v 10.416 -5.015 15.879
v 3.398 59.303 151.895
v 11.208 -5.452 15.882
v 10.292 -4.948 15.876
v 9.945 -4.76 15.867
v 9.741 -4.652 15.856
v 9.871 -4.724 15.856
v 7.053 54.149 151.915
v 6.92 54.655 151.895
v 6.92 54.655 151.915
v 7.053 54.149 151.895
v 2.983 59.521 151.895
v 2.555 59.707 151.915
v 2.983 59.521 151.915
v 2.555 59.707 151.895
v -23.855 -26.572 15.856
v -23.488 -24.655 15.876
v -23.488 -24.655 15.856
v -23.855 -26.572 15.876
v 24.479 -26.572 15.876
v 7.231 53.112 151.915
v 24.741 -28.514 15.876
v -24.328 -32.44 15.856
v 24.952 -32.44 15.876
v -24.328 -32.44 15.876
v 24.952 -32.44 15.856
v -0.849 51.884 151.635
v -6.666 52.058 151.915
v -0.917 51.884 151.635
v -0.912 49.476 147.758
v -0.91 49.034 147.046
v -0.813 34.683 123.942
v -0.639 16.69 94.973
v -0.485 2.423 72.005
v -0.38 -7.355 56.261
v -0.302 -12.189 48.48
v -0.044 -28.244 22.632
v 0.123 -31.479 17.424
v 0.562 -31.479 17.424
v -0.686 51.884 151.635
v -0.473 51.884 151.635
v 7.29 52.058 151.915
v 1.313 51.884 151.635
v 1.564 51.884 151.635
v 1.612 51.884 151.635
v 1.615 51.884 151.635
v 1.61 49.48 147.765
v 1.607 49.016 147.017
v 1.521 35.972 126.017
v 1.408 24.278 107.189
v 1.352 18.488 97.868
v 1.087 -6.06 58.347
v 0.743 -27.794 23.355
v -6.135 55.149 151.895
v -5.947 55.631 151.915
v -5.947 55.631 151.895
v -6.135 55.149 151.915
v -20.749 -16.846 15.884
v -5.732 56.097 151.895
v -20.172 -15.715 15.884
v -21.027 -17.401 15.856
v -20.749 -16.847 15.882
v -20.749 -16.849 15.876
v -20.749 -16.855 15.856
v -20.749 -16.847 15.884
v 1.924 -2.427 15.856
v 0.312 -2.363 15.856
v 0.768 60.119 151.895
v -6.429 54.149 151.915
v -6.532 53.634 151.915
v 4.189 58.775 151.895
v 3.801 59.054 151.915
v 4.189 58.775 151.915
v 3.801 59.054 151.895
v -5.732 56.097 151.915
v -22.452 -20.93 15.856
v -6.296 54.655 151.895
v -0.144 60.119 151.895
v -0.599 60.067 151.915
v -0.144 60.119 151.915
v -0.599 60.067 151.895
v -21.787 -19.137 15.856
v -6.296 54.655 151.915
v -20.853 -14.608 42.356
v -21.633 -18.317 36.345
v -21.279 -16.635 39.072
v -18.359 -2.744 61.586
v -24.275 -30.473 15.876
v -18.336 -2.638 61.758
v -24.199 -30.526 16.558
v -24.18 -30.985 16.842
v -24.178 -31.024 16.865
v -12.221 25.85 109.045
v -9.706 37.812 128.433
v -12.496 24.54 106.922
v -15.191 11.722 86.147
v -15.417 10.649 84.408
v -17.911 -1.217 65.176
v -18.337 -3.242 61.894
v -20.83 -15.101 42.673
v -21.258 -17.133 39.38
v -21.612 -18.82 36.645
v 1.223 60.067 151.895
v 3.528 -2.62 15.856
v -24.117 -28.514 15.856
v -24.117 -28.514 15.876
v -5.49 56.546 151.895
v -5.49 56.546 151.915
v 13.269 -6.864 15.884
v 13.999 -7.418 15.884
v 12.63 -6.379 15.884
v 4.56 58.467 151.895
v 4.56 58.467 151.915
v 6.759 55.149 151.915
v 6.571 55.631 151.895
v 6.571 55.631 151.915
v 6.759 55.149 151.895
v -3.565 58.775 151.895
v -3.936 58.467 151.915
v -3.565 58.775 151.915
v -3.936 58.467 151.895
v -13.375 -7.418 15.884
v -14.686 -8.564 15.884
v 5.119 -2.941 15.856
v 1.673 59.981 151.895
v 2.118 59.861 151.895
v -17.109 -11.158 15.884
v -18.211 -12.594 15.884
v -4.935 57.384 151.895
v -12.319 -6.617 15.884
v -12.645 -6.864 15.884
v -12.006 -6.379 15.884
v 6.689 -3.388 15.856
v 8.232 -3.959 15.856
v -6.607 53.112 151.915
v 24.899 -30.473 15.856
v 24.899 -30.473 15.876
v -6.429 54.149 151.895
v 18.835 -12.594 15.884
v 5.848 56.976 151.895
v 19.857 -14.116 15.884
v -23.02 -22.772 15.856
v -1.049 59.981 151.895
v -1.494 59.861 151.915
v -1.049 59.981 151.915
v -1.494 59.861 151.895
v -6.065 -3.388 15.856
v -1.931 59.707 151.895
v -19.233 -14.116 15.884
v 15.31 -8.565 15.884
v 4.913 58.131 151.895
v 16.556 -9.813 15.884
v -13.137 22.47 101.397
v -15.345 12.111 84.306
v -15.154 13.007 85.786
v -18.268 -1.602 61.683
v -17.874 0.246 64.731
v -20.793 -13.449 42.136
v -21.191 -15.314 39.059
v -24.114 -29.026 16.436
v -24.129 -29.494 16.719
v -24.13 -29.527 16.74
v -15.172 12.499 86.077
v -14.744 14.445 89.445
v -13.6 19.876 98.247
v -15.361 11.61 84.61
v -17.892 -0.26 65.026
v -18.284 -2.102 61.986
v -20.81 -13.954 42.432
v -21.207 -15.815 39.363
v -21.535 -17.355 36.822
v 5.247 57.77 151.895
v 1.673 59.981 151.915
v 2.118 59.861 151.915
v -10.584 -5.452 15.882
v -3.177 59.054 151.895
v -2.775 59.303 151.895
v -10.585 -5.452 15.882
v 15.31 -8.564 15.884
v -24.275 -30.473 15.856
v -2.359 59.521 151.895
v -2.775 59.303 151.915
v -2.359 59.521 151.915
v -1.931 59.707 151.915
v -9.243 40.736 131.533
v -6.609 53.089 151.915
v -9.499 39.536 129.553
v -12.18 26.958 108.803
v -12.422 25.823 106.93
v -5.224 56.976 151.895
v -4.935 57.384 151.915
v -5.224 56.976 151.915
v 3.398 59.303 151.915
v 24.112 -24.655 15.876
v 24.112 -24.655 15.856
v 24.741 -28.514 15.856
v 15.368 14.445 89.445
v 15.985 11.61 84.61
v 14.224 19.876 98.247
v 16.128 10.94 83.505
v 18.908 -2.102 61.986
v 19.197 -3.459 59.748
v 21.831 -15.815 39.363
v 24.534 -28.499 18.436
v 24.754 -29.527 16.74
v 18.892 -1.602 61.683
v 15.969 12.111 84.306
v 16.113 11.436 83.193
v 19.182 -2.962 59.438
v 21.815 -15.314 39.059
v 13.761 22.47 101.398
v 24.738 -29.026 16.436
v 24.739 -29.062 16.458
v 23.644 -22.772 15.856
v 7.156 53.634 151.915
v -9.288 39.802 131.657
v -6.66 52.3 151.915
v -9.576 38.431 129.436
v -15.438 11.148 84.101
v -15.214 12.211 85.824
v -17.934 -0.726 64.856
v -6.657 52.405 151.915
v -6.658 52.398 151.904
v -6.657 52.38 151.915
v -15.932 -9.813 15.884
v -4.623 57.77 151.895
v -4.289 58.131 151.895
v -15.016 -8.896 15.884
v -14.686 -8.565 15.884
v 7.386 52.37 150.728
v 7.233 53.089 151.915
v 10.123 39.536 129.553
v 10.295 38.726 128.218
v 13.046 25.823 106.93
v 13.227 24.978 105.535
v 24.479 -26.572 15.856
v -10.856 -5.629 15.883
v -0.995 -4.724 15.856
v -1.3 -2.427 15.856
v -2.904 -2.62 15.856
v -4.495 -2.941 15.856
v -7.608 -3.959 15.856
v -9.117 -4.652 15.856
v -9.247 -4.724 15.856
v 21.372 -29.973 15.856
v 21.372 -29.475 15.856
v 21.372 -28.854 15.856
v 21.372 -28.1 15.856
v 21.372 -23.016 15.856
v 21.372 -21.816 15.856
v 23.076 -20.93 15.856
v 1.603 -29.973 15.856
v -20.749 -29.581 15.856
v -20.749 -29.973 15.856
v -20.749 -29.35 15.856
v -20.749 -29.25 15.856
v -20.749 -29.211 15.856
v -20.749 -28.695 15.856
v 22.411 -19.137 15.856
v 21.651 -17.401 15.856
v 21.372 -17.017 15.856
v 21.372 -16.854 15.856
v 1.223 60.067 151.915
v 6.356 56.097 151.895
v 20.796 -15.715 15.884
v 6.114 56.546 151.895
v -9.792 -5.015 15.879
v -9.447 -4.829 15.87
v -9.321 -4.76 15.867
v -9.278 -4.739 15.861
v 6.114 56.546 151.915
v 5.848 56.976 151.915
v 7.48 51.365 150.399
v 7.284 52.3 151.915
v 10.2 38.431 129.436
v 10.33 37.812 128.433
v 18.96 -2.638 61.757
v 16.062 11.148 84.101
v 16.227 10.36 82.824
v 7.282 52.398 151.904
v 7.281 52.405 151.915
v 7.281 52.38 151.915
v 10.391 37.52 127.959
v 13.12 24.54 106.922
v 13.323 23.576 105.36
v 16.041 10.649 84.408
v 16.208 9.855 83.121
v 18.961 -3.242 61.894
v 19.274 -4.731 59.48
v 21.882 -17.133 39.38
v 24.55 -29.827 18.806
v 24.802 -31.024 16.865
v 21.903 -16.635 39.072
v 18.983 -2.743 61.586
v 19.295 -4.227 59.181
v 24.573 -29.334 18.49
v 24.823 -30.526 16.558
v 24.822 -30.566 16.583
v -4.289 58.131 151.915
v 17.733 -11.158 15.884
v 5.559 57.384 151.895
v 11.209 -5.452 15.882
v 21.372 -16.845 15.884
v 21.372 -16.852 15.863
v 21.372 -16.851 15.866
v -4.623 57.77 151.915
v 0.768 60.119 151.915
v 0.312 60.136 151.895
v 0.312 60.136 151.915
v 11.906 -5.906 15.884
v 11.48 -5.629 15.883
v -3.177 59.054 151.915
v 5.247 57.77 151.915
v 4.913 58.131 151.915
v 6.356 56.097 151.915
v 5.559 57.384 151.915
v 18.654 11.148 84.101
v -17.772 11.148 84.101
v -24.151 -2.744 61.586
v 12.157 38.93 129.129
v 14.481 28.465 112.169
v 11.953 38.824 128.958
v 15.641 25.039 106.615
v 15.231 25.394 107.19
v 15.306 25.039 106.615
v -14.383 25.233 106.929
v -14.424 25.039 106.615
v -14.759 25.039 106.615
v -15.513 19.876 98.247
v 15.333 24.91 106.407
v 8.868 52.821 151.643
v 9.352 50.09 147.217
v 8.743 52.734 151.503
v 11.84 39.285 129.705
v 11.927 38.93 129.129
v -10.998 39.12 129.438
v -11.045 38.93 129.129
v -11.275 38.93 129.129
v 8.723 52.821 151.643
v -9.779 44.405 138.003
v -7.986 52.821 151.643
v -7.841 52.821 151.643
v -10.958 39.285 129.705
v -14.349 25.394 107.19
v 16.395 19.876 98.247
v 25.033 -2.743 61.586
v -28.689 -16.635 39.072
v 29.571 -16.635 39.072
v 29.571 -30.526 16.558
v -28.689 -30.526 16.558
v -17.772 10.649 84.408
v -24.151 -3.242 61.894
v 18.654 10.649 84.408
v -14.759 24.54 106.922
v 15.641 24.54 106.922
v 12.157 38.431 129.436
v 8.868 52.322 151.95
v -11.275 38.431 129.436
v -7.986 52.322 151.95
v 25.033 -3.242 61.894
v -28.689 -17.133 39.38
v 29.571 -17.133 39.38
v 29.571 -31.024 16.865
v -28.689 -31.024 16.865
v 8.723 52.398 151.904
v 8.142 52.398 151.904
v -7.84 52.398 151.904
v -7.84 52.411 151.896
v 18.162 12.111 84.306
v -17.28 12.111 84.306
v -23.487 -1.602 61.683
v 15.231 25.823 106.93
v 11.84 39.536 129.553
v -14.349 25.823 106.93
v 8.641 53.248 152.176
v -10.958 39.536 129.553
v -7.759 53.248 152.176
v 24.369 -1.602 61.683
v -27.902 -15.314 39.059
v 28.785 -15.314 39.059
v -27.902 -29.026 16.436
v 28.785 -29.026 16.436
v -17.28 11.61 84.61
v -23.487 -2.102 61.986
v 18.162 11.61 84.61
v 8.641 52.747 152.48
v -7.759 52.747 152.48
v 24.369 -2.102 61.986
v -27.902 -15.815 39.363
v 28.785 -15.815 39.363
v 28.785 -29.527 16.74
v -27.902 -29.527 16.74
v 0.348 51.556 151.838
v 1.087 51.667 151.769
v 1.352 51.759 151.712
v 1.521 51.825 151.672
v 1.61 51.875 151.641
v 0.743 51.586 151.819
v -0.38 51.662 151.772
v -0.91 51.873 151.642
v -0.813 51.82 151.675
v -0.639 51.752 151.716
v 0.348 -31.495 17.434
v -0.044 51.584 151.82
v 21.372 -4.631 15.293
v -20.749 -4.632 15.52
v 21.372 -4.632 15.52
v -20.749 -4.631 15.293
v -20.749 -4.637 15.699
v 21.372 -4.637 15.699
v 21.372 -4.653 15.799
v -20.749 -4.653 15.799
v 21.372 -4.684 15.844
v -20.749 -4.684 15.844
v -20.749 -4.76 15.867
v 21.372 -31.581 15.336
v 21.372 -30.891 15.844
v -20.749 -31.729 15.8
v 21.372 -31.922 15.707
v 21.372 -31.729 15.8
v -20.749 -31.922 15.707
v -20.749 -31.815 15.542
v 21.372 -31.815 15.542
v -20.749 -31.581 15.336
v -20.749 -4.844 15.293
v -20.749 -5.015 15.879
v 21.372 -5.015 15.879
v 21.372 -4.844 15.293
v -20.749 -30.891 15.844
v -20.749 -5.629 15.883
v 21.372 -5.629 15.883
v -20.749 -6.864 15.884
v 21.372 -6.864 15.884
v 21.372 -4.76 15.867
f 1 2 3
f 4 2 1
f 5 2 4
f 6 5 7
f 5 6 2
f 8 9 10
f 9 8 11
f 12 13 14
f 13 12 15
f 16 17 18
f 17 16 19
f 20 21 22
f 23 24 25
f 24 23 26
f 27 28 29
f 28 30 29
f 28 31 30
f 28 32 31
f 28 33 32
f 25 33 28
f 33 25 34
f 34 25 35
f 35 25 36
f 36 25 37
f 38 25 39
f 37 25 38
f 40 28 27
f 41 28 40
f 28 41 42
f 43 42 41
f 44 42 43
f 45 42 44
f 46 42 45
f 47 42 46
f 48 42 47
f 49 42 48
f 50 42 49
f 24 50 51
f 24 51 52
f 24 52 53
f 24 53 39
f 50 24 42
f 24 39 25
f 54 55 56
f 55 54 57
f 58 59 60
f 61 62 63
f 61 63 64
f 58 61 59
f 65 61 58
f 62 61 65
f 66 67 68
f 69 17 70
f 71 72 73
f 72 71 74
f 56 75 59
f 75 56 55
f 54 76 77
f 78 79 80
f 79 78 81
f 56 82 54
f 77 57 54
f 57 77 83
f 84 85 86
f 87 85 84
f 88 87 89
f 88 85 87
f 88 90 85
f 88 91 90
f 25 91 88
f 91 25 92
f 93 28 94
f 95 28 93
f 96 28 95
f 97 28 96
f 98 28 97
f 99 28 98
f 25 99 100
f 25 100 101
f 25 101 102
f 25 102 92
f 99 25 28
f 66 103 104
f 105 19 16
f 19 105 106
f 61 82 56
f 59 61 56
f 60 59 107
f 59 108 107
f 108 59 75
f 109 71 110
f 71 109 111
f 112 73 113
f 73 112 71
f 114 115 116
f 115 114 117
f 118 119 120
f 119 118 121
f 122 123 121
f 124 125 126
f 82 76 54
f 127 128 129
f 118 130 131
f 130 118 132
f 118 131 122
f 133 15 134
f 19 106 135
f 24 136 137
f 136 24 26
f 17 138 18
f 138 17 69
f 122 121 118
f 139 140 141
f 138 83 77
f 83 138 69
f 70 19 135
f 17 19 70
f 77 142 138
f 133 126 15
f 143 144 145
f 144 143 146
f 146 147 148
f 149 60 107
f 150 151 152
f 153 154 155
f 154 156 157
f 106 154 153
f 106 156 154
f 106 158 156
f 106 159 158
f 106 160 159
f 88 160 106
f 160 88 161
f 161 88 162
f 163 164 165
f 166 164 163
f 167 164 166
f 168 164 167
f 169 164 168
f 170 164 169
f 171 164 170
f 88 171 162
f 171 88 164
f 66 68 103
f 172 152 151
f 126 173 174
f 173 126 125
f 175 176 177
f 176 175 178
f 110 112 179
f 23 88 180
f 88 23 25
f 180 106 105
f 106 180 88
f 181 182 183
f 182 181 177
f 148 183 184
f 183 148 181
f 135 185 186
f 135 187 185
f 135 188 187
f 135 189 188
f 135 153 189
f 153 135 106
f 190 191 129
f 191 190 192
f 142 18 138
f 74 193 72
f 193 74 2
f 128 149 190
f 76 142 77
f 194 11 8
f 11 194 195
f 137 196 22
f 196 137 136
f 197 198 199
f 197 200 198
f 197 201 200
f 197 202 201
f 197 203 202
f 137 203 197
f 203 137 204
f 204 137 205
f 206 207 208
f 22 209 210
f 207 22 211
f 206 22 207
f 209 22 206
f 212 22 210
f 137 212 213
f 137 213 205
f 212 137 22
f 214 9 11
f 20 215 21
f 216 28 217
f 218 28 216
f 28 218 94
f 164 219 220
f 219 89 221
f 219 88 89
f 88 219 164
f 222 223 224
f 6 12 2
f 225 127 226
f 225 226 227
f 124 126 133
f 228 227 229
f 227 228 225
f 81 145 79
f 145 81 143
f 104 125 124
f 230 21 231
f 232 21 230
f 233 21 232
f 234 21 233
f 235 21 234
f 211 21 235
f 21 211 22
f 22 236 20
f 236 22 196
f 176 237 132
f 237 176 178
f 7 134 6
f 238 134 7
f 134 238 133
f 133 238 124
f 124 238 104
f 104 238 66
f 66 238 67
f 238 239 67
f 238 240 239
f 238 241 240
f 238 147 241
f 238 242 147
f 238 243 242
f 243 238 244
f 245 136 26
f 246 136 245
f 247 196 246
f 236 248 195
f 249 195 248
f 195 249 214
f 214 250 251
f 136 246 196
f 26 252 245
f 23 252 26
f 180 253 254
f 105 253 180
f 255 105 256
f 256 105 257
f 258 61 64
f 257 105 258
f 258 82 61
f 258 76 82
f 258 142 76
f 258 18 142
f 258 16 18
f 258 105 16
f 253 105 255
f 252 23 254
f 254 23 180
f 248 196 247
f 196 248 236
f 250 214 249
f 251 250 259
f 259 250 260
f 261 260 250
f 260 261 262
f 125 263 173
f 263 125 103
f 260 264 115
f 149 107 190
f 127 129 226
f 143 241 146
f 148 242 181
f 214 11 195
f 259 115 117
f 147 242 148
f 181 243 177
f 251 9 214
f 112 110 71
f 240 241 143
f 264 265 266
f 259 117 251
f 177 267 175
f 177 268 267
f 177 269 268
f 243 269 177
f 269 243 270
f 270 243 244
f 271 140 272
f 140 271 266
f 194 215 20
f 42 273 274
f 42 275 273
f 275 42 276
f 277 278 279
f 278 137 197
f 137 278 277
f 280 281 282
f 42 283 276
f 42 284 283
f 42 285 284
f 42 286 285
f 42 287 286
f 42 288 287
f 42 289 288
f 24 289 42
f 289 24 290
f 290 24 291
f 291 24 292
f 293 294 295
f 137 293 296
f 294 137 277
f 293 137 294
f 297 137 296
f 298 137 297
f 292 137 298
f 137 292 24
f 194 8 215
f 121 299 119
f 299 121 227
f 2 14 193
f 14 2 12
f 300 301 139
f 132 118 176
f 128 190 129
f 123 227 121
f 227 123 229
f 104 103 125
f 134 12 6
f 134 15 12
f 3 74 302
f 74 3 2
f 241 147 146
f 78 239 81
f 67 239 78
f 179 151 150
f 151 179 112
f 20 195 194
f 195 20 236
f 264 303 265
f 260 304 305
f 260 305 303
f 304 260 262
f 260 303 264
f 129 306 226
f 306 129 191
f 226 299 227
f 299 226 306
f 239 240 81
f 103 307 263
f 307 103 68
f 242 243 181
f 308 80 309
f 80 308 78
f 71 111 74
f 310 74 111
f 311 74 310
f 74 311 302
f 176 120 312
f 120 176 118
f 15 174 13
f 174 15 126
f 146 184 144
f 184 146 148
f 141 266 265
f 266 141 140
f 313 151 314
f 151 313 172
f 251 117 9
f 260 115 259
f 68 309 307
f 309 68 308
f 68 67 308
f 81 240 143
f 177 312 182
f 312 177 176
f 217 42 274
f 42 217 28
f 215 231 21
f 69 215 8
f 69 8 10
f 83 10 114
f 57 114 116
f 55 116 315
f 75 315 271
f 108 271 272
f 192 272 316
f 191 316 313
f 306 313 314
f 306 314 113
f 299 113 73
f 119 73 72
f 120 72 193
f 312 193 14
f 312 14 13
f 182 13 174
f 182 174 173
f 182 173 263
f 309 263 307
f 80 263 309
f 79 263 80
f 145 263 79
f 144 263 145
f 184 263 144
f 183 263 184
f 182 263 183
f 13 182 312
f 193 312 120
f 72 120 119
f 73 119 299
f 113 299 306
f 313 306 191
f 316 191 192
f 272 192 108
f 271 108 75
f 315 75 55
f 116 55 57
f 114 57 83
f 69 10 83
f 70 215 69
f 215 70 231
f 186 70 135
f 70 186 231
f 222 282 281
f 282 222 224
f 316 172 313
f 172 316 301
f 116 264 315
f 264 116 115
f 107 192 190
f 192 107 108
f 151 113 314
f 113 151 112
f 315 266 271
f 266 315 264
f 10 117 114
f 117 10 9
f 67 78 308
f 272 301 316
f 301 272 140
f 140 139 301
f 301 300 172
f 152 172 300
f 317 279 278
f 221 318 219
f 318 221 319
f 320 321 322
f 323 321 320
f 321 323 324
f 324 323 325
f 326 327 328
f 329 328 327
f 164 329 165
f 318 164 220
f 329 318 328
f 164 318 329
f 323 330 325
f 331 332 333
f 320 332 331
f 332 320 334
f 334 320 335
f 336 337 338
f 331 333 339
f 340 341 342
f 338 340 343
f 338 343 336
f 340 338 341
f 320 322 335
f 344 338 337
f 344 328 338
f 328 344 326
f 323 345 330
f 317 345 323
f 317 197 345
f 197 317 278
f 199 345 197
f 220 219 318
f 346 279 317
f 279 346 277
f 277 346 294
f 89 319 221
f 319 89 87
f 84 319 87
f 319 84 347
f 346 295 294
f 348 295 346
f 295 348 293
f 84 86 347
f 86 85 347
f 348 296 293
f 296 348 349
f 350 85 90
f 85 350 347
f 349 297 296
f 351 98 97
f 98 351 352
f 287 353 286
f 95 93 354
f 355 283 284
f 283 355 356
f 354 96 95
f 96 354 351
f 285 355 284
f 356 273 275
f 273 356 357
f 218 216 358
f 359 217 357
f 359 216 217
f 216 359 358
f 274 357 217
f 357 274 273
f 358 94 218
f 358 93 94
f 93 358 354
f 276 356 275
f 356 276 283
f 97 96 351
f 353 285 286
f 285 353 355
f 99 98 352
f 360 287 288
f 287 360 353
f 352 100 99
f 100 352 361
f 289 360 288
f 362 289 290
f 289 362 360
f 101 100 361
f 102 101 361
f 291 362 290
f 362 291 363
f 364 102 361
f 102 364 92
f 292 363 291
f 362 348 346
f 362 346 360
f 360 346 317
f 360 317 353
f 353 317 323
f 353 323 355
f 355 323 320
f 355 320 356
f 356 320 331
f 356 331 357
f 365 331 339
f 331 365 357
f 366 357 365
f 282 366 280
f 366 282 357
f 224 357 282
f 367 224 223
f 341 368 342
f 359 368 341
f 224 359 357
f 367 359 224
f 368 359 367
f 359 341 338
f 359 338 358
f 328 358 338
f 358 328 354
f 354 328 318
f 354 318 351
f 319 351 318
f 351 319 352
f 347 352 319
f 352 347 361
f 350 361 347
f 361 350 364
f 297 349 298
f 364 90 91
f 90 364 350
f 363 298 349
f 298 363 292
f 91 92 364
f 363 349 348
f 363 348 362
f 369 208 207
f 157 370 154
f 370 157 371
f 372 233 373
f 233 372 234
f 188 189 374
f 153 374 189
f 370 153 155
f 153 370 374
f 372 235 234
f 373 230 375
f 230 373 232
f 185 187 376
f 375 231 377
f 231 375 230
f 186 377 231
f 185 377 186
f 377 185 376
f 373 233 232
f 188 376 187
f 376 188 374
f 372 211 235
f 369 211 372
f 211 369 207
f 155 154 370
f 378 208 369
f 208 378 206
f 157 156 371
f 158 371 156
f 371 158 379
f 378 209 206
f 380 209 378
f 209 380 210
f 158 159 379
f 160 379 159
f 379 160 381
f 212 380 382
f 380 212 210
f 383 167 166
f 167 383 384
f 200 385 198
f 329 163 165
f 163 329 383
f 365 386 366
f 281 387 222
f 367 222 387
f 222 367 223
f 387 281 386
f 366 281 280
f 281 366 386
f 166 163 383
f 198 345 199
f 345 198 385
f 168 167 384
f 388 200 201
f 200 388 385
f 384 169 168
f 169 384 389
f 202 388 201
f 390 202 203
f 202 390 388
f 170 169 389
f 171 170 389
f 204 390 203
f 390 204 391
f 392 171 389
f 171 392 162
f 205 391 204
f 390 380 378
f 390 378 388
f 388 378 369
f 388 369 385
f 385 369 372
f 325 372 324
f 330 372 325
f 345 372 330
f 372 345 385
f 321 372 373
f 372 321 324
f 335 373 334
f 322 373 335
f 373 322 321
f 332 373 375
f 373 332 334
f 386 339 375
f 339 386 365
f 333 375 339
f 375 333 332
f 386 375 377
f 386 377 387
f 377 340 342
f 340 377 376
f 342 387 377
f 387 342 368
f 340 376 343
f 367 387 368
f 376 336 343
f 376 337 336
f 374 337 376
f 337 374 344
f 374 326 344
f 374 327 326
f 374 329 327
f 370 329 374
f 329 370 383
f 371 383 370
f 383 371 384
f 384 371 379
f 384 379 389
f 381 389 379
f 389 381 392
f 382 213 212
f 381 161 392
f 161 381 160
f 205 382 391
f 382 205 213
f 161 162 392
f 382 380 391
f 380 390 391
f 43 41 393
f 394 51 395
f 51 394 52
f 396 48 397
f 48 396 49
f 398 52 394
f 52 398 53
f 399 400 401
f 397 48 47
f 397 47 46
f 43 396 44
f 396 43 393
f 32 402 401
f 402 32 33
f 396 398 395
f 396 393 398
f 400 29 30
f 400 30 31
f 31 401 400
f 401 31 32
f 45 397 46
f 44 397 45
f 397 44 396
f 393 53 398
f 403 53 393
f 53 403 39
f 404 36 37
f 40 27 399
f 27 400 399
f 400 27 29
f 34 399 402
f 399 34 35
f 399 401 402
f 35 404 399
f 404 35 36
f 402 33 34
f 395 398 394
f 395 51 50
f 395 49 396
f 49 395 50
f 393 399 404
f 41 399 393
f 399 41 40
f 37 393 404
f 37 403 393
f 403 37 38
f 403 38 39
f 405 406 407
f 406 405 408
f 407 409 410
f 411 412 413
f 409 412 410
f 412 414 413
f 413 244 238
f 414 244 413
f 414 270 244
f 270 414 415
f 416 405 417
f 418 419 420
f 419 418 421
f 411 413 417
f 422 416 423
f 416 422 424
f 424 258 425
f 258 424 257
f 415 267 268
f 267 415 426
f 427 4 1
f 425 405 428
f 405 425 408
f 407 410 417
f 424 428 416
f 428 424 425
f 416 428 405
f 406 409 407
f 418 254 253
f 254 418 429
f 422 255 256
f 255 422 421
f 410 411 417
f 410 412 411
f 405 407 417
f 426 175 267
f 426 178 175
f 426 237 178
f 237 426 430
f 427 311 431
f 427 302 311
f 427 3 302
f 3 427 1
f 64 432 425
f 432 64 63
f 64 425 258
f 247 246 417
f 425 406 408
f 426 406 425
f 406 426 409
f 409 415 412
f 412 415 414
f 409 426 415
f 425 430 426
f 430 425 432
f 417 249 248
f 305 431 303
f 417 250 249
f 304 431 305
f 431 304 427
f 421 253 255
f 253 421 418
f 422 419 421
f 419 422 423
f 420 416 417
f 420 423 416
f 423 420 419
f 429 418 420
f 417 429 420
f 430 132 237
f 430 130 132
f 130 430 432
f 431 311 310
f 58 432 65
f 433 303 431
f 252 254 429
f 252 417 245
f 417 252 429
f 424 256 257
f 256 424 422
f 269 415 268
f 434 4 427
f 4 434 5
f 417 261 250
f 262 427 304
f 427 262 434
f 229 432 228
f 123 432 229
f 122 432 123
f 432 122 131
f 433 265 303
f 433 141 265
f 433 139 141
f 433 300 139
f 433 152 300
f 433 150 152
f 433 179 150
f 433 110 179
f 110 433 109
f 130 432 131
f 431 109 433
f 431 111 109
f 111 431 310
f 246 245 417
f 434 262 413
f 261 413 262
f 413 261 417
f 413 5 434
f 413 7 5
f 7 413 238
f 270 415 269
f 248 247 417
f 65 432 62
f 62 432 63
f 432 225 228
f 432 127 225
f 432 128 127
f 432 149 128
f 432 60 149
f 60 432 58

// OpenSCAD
// file: parts/sb_harp_wood_inside.scad
// sb_harp_wood_inside
// SOUNDBOX inner lining piece "harp_wood_inside".
// Reverse-engineered from analysis JSON (model world units, NOT mm).
//
// Construction choice: FLAT PLATE (linear_extrude of a constant outline).
//   OBB dims = [42.12, 27.29, 0.646].  One OBB dim (0.646, along principal
//   axis e0) is ~42x/~66x smaller than the other two => thin flat plate.
//   The 7 cross-sections sliced along the long axis (e1) are essentially
//   identical (same outline within sub-0.1 unit jitter) => CONSTANT profile,
//   so a single outline swept along e1 reproduces the shape exactly.
//
// The 7 cross-sections are sliced along the SWEEP axis = e0 (= world X,
// section world_pos.x runs -20.75 .. +21.37 while y,z stay fixed).
// Each section outline is given in the (e1, e2) plane:
//   outline 1st coord = e1 (the 27.29-wide outline coordinate, ~world Y),
//   outline 2nd coord = e2 (the 0.646 thin/thickness coordinate, ~world Z).
//
// Local frame used to build geometry (per SHARED CONTRACT
// world = centroid + u*e1 + v*e2 + w*e0):
//   local x = u = e1 (outline width coordinate)
//   local y = v = e2 (outline thin/thickness coordinate)
//   local z = w = e0 (sweep axis)
// Placed back to world coords with multmatrix whose columns are
//   [ e1 | e2 | e0 | centroid ].

module sb_harp_wood_inside() {
    // --- principal axes from JSON (e0=thin, e1=long sweep, e2=width) ---
    e0 = [ 0.999999999999999, 4.080533203209976e-08, -5.195677116993409e-09 ];
    e1 = [ -4.079117591697188e-08, 0.9999963656460189, 0.0026960516967458603 ];
    e2 = [ 5.305671518725019e-09, -0.002696051696745555, 0.99999636564602 ];
    centroid = [ 0.31174035168980263, -18.940998050994775, 15.742848081661917 ];

    // --- key dimensions (model units) ---
    sweep_min = -21.06039328592594;   // obb_min along e0 (sweep axis)
    sweep_max =  21.06042008382528;   // obb_max along e0 (sweep axis)
    sweep_len = sweep_max - sweep_min; // ~42.12 long axis

    // Cross-section outline in (e1, e2) plane (first coord -> local x = e1
    // = width ~27.29; second coord -> local y = e2 = thickness ~0.646).
    // Taken from the mid-section (s ~= 0); all sections match to ~0.1 units.
    outline = [
        [ -12.98081096319675,   -0.0012004146546172184 ],
        [ -12.874776522523836,  -0.16576777850281812   ],
        [ -12.641078374338878,  -0.3725658134383558    ],
        [  14.095366556414852,  -0.4882501226337789    ],
        [  14.30897821146989,   -0.48882601782636426   ],
        [  14.308761640427582,  -0.26176333704600196   ],
        [  14.303445951094751,  -0.08202747384794523   ],
        [  14.287969748227038,   0.017577257752377187  ],
        [  14.257419992889528,   0.06228029785476115   ],
        [  14.18123671256184,    0.08592041681057808   ],
        [  13.926107364267846,   0.09864081380347323   ],
        [  13.31236823452081,    0.10473104760524393   ],
        [  12.077700923804764,   0.10869112129297366   ],
        [  11.926059988181972,   0.10910092342014076   ],
        [   4.950142847152765,   0.12790843002158353   ],
        [   2.356783781076516,   0.1349002872010575    ],
        [  -0.26820909907201795, 0.14197740760655003   ],
        [  -2.8519094283243756,  0.14894226890156992   ],
        [  -5.4142015490897055,  0.1552180776580507    ],
        [  -7.910553767061631,   0.1575137950631383    ],
        [ -10.219125788309363,   0.15170624829559382   ],
        [ -11.950139712218796,   0.1329374904585362    ],
        [ -12.78788193291687,    0.09148236649036412   ],
    ];

    multmatrix([
        [ e1[0], e2[0], e0[0], centroid[0] ],
        [ e1[1], e2[1], e0[1], centroid[1] ],
        [ e1[2], e2[2], e0[2], centroid[2] ],
        [ 0,     0,     0,     1           ],
    ])
    // extrude the (e1,e2) outline along local z (= e0 sweep axis)
    translate([0, 0, sweep_min])
        linear_extrude(height = sweep_len)
            polygon(points = outline);
}

sb_harp_wood_inside();
// file: parts/sb_harp_wood_plank.scad
// sb_harp_wood_plank.scad
// Soundbox part: harp_wood_plank
//
// Construction: FLAT/THIN BAR -> linear_extrude of a constant cross-section.
// Justification from the analysis JSON:
//   obb_dims = [157.99, 2.60, 0.715]  (along principal axes e0, e1, e2).
//   The long axis e0 (157.99) >> the other two. Sections are sliced along e0
//   (s from -79.00 .. +78.99). All 7 cross-section outlines (outline_e1e2) are
//   essentially IDENTICAL: e1 spans +/-1.30 (width 2.60), e2 spans -0.481..0.234
//   (thickness ~0.715). So the profile is a constant 2D outline in the (e1,e2)
//   plane swept along e0  -> linear_extrude of that single outline.
//
// Local frame (per shared contract): x = e1, y = e2, z = e0.
//   world = centroid + x*e1 + y*e2 + z*e0
//   multmatrix columns: [e1, e2, e0, centroid]

module sb_harp_wood_plank() {
    // --- key dimensions (model world units) ---
    length_e0   = 157.99349936504035; // long axis extent (OBB dim along e0)
    s_min       = -79.00199779074894; // start of sweep along e0
    // width along e1 ~ 2.60, thickness along e2 ~ 0.715 are encoded in the outline

    // Representative constant cross-section in the (e1=x, e2=y) plane,
    // taken from the central section s ~= 0 (n_pts = 25).
    profile = [
        [-1.304068613138129,   0.039914452730746675],
        [-1.2988414417338716, -0.03920977952225879],
        [-1.2619292589382591, -0.10661357487112998],
        [-1.1647280374804423, -0.1698429468966287],
        [-0.99087463649703,   -0.24914266551218311],
        [-0.7315022194947558, -0.3551233613066156],
        [-0.3954583800005634, -0.44727456985152614],
        [-0.0038031597561305947, -0.48089703076206947],
        [ 0.3912742338218062, -0.4458243328934035],
        [ 0.73588004868243,   -0.3504180548228808],
        [ 1.0004441501844406, -0.24255720658648894],
        [ 1.1693076613345343, -0.16573332753383863],
        [ 1.2581205347344715, -0.10634987031153553],
        [ 1.2911667131536821, -0.0407195898591004],
        [ 1.295934128762341,   0.03816542762517994],
        [ 1.2912792546972822,  0.1270234519437894],
        [ 1.2912761508157018,  0.12705869741439013],
        [ 1.2583218280177508,  0.19833928175529536],
        [ 1.1695688953365784,  0.22829787676322244],
        [ 1.0007615422199547,  0.23266994191751955],
        [ 0.7362698133269031,  0.23285942284119],
        [-0.9904897736221766,  0.23400989818133677],
        [-1.164417047013931,   0.22985412235596048],
        [-1.26171150515054,    0.20002350118136558],
        [-1.2987277245542947,  0.12877525746163343]
    ];

    // Place the part at its original world coords.
    // multmatrix([[e1x,e2x,e0x,cx],[e1y,e2y,e0y,cy],[e1z,e2z,e0z,cz],[0,0,0,1]])
    multmatrix([
        [ 0.9999997748485234,    -0.0006710461244862703,  3.807473468457577e-08, 0.3513917557574726],
        [ 0.0005708356524937477,  0.8506949335985642,     0.5256593993227865,   10.44220652615824],
        [-0.0003527740926992308, -0.5256592809480621,     0.8506951251203959,   84.38742842926786],
        [ 0, 0, 0, 1]
    ]) {
        // Sweep the constant profile along z (= e0).
        translate([0, 0, s_min])
            linear_extrude(height = length_e0)
                polygon(points = profile);
    }
}

sb_harp_wood_plank();
// file: parts/sb_harp_white_wood_02.scad
// sb_harp_white_wood_02
// Soundboard face "harp_white_wood_02".
// CONSTRUCTION: flat plate -> linear_extrude of the footprint outline.
// Justification (from analysis JSON):
//   obb_dims = [158.73, 56.69, 0.586]  ->  one dimension (0.586) is ~100x
//   smaller than the other two  =>  thin flat plate.
//   The thin axis is OBB axis 2 = principal axis e2 (the local v / thickness
//   direction). The broad face spans OBB axis 0 (=e0, local w, the long axis,
//   sectioned at s) and principal axis e1 (local u, the width).
//   Cross-sections are NOT rectangular: the half-width in u tapers from
//   +/-28.34 at the base down to +/-8.2 at the tip (a fan/wedge), so we
//   build the (u,w) footprint polygon and extrude it by the measured thickness.

module sb_harp_white_wood_02() {
    // ---- principal frame (from JSON: e0, e1, e2 + centroid) ----
    // multmatrix columns = [e1, e2, e0, centroid]; local (x=u, y=v, z=w).
    e0 = [4.474615656687517e-08, 0.5183353942269119,  0.8551774196572486];
    e1 = [0.9999999999999879,   -1.4964715064137968e-07, 3.8379472494624116e-08];
    e2 = [1.4786830315027656e-07, 0.8551774196572364, -0.5183353942269123];
    centroid = [0.44120035460671436, -0.16629279995937019, 64.67363399367734];

    // ---- key dimensions ----
    thickness = 0.5855388569197899;   // obb_dims[2] = plate thickness (v / e2)
    v_mid     = 0.03;                 // mean v offset of the broad face (~0.0..0.06)

    // Footprint outline in the (u, w) plane: [half_width_u, w_position].
    // half_width_u = max |e1-coord| per section; w_position = section s.
    hw = [ [28.343660,  -56.210922],   // base
           [28.343660,  -29.756280],
           [23.927787,   -3.301638],
           [17.721288,   23.153004],
           [14.789847,   49.607646],
           [11.399227,   76.062288],
           [ 8.199973,  102.516930] ]; // tip

    // Build the symmetric footprint: up the +u edge (base->tip), down the -u edge.
    foot_pos = [ for (p = hw) [ p[0], p[1] ] ];                 // x=u, y=w
    foot_neg = [ for (i = [len(hw)-1 : -1 : 0]) [ -hw[i][0], hw[i][1] ] ];
    footprint = concat(foot_pos, foot_neg);

    multmatrix([
        [e1[0], e2[0], e0[0], centroid[0]],
        [e1[1], e2[1], e0[1], centroid[1]],
        [e1[2], e2[2], e0[2], centroid[2]],
        [0,     0,     0,     1]
    ])
    // Extrude the (u,w) footprint by the thickness along local v (y).
    // rotate maps the 2D polygon plane (x=u, y=w) to (x=u, z=w) and the
    // extrude/thickness axis (z) to local y = v.
    translate([0, v_mid, 0])
        rotate([90, 0, 0])
            linear_extrude(height = thickness, center = true)
                polygon(points = footprint);
}

sb_harp_white_wood_02();
// file: parts/sb_harp_white_wood_01.scad
// sb_harp_white_wood_01 — soundboard face (flat tapered plate)
//
// Construction choice: FLAT PLATE -> linear_extrude(thickness) of a 2D outline.
// Justification (from analysis JSON):
//   obb_dims = [158.728, 58.260, 0.586]. The third OBB extent (0.586) is ~270x
//   smaller than the other two -> a thin flat plate lying in the e0-e1 plane with
//   its thickness along e2. Every cross-section outline has an e2 spread of only
//   ~0.02-0.06 confirming the slab is essentially planar.
//   The outline is symmetric in e1 and tapers monotonically in width from 58.26
//   (at e0=-56.2) down to 16.86 (at e0=+102.5) -> a tapered trapezoid-ish plate.
//   So: build the tapered outline in the (e0,e1) plane and extrude it by the
//   measured thickness along e2. Placed at original world coords via multmatrix.

module sb_harp_white_wood_01() {
    // --- key dimensions (model world units), from JSON ---
    thickness = 0.5855474371629796;            // obb_dims[2], slab thickness (along e2)
    e2_mid    = (-0.06552327076825293 + 0.5200241663947267) / 2; // outline mid-plane offset in e2

    // principal frame (columns e1,e2,e0) + centroid, from JSON
    // world = centroid + u*e1 + v*e2 + w*e0 ; local: x=u(e1), y=v(e2), z=w(e0)
    // centroid
    cx = 0.44119784559796194;
    cy = -1.4524250851382396;
    cz = 64.66925852212562;
    // e1 (principal_axes[1])
    e1x = 0.9999999999999987;  e1y = 5.101571019845674e-08;  e1z = 1.1910700121443101e-08;
    // e2 (principal_axes[2])
    e2x = -3.7162652564615806e-08; e2y = 0.8510479848443533; e2z = -0.525087923582674;
    // e0 (principal_axes[0])
    e0x = -3.692431067464216e-08; e0y = 0.5250879235826725; e0z = 0.851047984844354;

    // --- tapered outline in the (e0 , e1) plane ---
    // each row: [s_along_e0, half_width_in_e1]   (outline is symmetric in e1)
    s_hw = [
        [ -56.210913273070176, 29.130 ],
        [ -29.756272516140438, 29.130 ],
        [  -3.3016317592107,   24.592 ],
        [  23.15300899771904,  18.213 ],
        [  49.607649754648776, 15.200 ],
        [  76.06229051157852,  11.716 ],
        [ 102.51693126850826,   8.427 ]
    ];
    n = len(s_hw);

    // build closed polygon in the (e1 , e0) plane: x = e1, y = e0
    // down the +e1 edge (top->bottom in e0), back up the -e1 edge
    pts_pos = [ for (i=[0:n-1])    [  s_hw[i][1], s_hw[i][0] ] ];
    pts_neg = [ for (i=[n-1:-1:0]) [ -s_hw[i][1], s_hw[i][0] ] ];
    poly = concat(pts_pos, pts_neg);   // (x=e1, y=e0)

    multmatrix([[e1x, e2x, e0x, cx],
                [e1y, e2y, e0y, cy],
                [e1z, e2z, e0z, cz],
                [0,   0,   0,   1]]) {
        // Local target frame: x=e1, y=e2(thickness), z=e0.
        // Extrude poly (x=e1, y=e0) along z by thickness, then rotate([90,0,0]):
        //   (x,y,z) -> (x, -z, y)  => local_x=e1, local_y=-thickness, local_z=e0.
        translate([0, e2_mid, 0])      // shift to outline mid-plane along local y (e2)
            rotate([90, 0, 0])         // map extrude axis -> local y, poly-y(e0) -> local z
                linear_extrude(height = thickness, center = true)
                    polygon(points = poly);
    }
}

sb_harp_white_wood_01();
// file: parts/sb_harp_big_side_pivot.scad
// sb_harp_big_side_pivot - SOUNDBOX BODY = straight-sided HALF-CONE
// D cross-section in the world X(width)-Y(depth) plane: FLAT soundboard side at Y=yflat,
// arc belly bulging to +Y. Wings dropped (arc-only width). Straight sides = hull(bass,treble).
// Body rakes in Y-Z; the two caps sit at their world Z, so the hull reproduces the rake.
nh=48;
function _hc_arc(W,D,xc,yf)=[for(i=[0:nh]) let(t=180*i/nh)[ xc+(W/2)*cos(t), yf+D*sin(t) ]];
module _hc_cap(z,xc,yf,W,D,eps) translate([0,0,z]) linear_extrude(height=eps) polygon(_hc_arc(W,D,xc,yf));
module sb_harp_big_side_pivot(){
    eps=0.02;
    bz=15.856; bxc=0.312; byf=-32.440; bW=49.280; bD=30.077;
    tz=151.895; txc=0.312; tyf=52.058; tW=13.957; tD=8.078;
    hull(){ _hc_cap(bz,bxc,byf,bW,bD,eps); _hc_cap(tz,txc,tyf,tW,tD,eps); }
}
sb_harp_big_side_pivot();
// main file
// ============================================================================
// soundbox.scad  --  Harp SOUNDBOX assembly (reverse-engineered parametric model)
// ============================================================================
//
// PIPELINE: This is the SOUNDBOX pass of a reusable reverse-engineering pipeline
//   (Blender clements49.blend -> per-part analysis JSON -> per-part OpenSCAD
//    module -> this assembly). Other subsystems (strings, neck, base, ...) are
//   handled in separate passes and are NOT included here.
//
// UNITS: model units (NOT mm). All geometry is kept in the original Blender
//   world coordinates so the rebuilt soundbox sits exactly where the original
//   model did; no re-centering or rescaling is applied.
//
// COORDINATE CONVENTION (matches the source model):
//   Z = up            (model spans z 0 .. 216.5)
//   X = front(-) / back(+)
//   Y = left / right  (about +/- 36)
//   Overall model bbox: x[-62.6,62.6] y[-36.1,36.1] z[0,216.5]
//
// SOUNDBOX union bbox (5 parts; harp_wood_inside1 excluded as neck-region):
//   min [-30.07, -35.38, 15.293]   max [30.694, 60.301, 152.295]   dims ~[60.76, 95.68, 137.0]
//
// NOTE ON include vs use:
//   Each sb_*.scad part file ends with a top-level self-call (so the part can be
//   rendered standalone for verification). We therefore use<> the part files
//   here instead of include<>: use<> imports the module DEFINITIONS only and
//   suppresses those top-level calls, so the assembly below controls exactly
//   what is rendered (no accidental double-render). Each module already places
//   its geometry at the original world coords via its own multmatrix, so the
//   assembly simply calls them with no extra transform.
// ============================================================================

// ---- part modules (definitions only; top-level self-calls suppressed) ----
use <parts/sb_harp_big_side_pivot.scad>   // body shell  (loft / hull)
use <parts/sb_harp_white_wood_01.scad>    // soundboard face 1 (flat plate)
use <parts/sb_harp_white_wood_02.scad>    // soundboard face 2 (flat plate)
use <parts/sb_harp_wood_plank.scad>       // plank        (flat bar)
use <parts/sb_harp_wood_inside.scad>      // inner lining (flat plate)
// harp_wood_inside1 REMOVED: it sits at z 174.6-189.8, ABOVE the soundboard top
// (151.9) -> it is a NECK-region piece, not soundbox. To be handled in the neck pass.

// ============================================================================
// KEY DIMENSION VARIABLES  (model units; informational / drive previews)
// ============================================================================

// --- expected soundbox envelope (union of the 6 part AABBs) ---
sb_bbox_min    = [-30.07, -35.38,  15.293];
sb_bbox_max    = [ 30.694, 60.301, 152.295];   // (harp_wood_inside1 excluded -> neck)
sb_dims        = [ sb_bbox_max[0]-sb_bbox_min[0],
                   sb_bbox_max[1]-sb_bbox_min[1],
                   sb_bbox_max[2]-sb_bbox_min[2] ];   // ~[60.76, 95.68, 174.47]
sb_center      = [ (sb_bbox_min[0]+sb_bbox_max[0])/2,
                   (sb_bbox_min[1]+sb_bbox_max[1])/2,
                   (sb_bbox_min[2]+sb_bbox_max[2])/2 ]; // ~[0.312, 12.46, 102.53]

// --- principal member dimensions (from analysis OBBs) ---
body_obb_dims        = [164.95, 60.76, 25.93];  // harp_big_side_pivot (tapered box shell)
soundboard1_obb_dims = [158.73, 58.26,  0.59];  // harp_white_wood_01  (flat face)
soundboard2_obb_dims = [158.73, 56.69,  0.59];  // harp_white_wood_02  (flat face)
plank_obb_dims       = [157.99,  2.60,  0.71];  // harp_wood_plank     (flat bar)
inside_obb_dims      = [ 42.12, 27.29,  0.65];  // harp_wood_inside    (flat plate)
// inside1 (harp_wood_inside1) excluded -> neck-region piece (z 174.6-189.8)

// --- render quality ---
$fn = 48;

// ============================================================================
// ASSEMBLY  --  all 5 soundbox members at original world coords
// ============================================================================
module soundbox() {
    // body shell -- the bulk of the soundbox (tapered/curved box, hull loft)
    sb_harp_big_side_pivot();

    // soundboard faces (the two flat front plates)
    sb_harp_white_wood_01();
    sb_harp_white_wood_02();

    // central plank running the length of the box
    sb_harp_wood_plank();

    // inner lining (bass-bottom plate)
    sb_harp_wood_inside();
}

soundbox();
